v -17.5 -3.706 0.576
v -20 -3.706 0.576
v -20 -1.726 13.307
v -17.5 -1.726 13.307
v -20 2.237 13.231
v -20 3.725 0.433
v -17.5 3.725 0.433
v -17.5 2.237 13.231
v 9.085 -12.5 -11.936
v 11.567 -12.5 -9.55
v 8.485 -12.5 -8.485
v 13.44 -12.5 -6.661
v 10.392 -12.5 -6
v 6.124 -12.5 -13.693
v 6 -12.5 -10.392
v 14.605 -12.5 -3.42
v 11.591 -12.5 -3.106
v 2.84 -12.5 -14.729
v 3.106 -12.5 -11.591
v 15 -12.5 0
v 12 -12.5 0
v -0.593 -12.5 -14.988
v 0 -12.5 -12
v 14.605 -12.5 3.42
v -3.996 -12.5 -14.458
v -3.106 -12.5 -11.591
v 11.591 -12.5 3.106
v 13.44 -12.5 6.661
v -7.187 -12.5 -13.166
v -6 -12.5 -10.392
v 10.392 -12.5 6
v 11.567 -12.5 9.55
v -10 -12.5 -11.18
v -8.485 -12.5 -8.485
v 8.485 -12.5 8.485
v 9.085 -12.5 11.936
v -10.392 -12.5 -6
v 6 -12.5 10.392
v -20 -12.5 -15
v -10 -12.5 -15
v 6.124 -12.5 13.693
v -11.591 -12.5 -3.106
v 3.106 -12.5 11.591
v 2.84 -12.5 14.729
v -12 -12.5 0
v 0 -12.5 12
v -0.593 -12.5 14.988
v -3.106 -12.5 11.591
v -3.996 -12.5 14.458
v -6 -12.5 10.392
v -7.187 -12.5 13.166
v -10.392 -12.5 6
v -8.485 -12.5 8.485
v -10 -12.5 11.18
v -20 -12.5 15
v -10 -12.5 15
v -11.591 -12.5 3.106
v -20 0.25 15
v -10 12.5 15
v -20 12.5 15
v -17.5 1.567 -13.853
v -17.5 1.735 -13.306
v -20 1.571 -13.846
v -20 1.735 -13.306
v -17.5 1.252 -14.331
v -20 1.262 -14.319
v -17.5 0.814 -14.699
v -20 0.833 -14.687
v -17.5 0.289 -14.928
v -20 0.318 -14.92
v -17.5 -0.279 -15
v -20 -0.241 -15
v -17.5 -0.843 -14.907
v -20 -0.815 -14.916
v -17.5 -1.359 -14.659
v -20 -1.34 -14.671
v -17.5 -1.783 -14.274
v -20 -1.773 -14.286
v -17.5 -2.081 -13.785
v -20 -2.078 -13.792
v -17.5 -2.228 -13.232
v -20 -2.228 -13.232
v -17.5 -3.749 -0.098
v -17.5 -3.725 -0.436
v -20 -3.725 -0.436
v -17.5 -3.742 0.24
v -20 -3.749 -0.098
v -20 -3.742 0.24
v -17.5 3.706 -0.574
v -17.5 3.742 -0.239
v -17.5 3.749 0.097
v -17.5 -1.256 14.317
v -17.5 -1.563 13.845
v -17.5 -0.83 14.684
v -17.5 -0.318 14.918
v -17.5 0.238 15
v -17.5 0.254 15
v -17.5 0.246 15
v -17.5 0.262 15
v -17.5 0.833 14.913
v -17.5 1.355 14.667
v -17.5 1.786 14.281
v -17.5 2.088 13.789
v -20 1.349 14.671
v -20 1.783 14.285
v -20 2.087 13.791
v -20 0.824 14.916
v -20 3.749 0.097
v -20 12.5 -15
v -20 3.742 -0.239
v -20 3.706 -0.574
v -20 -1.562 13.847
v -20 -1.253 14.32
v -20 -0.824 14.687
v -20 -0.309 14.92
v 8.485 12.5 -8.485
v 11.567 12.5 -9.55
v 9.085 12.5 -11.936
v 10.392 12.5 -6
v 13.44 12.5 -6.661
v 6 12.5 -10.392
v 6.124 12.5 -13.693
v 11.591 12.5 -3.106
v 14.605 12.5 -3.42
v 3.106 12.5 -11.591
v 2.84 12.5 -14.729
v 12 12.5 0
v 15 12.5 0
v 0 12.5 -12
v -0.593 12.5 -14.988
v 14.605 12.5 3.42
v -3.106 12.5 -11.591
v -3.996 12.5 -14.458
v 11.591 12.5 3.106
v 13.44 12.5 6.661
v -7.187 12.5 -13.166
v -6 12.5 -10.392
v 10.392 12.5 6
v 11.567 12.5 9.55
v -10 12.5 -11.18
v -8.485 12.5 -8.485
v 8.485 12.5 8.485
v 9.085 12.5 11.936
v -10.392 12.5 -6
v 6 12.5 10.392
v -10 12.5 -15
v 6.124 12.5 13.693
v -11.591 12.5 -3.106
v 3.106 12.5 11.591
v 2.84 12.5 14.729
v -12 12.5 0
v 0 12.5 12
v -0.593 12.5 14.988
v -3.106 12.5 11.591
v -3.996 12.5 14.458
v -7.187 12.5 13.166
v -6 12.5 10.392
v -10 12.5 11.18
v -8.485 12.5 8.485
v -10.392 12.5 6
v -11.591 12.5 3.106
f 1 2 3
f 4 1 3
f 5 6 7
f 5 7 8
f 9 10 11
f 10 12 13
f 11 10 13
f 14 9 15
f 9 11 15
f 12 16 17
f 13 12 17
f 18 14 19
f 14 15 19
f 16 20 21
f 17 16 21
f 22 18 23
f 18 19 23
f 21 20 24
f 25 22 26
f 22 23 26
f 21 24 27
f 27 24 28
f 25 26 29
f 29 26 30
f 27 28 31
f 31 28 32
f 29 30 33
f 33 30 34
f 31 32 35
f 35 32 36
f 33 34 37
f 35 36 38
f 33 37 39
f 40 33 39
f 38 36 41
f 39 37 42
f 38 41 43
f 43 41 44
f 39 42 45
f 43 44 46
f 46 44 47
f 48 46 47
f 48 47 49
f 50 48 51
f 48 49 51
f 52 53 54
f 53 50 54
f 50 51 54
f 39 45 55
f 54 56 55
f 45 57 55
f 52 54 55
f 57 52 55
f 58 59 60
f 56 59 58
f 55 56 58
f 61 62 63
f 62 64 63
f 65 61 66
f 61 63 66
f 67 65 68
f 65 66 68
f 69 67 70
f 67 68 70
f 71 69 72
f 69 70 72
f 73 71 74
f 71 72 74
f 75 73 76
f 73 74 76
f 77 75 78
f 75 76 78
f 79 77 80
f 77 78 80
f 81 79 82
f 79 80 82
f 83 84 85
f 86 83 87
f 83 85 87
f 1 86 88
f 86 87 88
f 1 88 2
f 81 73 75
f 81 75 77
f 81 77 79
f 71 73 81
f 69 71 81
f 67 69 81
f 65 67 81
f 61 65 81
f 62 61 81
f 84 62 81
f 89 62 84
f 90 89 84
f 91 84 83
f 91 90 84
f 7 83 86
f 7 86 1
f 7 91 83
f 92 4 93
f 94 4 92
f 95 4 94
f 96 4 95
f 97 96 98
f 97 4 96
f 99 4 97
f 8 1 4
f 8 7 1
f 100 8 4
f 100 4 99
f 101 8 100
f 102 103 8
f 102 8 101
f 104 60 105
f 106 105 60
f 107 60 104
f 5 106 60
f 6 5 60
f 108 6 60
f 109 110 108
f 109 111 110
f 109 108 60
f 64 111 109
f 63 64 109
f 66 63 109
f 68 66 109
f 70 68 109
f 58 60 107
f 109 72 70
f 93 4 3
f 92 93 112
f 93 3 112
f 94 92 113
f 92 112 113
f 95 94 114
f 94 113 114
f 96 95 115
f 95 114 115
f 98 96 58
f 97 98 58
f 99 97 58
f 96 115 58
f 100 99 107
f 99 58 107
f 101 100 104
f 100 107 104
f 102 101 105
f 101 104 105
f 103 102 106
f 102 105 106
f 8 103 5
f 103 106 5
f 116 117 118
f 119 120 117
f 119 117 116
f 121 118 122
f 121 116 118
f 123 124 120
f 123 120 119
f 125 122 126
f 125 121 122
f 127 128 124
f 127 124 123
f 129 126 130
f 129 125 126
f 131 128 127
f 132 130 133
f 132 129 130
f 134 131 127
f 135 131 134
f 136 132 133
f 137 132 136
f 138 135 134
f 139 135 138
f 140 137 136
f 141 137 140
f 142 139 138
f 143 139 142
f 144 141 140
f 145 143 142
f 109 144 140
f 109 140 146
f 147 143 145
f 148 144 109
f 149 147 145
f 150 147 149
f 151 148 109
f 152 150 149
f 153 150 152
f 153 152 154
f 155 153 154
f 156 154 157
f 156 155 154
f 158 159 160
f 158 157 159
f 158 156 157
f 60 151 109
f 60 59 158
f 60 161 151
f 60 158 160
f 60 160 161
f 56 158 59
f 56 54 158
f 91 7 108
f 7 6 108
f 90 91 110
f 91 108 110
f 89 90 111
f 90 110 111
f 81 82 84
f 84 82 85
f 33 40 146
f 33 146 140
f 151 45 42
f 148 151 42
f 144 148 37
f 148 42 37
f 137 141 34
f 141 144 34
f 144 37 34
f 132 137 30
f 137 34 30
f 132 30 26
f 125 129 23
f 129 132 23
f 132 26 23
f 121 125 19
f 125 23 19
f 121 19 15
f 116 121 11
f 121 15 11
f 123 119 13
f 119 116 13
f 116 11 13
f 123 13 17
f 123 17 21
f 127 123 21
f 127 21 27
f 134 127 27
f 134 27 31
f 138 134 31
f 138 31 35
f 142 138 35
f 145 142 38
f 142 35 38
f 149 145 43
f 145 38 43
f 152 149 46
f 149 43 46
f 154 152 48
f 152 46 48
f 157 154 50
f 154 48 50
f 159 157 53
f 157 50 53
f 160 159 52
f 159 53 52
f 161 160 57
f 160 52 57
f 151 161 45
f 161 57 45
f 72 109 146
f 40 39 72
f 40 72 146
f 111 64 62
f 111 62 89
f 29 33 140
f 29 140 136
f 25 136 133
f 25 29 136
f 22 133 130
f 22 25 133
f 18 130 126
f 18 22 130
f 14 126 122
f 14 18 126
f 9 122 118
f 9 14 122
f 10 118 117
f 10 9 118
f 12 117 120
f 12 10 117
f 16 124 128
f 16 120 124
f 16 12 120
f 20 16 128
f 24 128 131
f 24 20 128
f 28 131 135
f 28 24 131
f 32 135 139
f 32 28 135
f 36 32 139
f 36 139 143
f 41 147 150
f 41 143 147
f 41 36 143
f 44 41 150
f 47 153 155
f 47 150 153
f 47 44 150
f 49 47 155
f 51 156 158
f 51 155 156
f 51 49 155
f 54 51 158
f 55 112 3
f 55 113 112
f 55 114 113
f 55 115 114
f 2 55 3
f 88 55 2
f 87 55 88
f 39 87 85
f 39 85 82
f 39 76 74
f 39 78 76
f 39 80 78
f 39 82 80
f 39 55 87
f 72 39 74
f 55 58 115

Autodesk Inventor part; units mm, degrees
ref_plane "YZ Plane" through (0, 0, 0) normal (1, 0, 0) x (0, 1, 0)
ref_plane "XZ Plane" through (0, 0, 0) normal (0, 1, 0) x (-1, 0, 0)
ref_plane "XY Plane" through (0, 0, 0) normal (0, 0, 1) x (1, 0, 0)
sketch "Sketch1" plane through (0, 0, 0) normal (0, 1, 0) x (-1, 0, 0)
  arc A0 (12, 9) -> (10, -11.1803) centre (0, 0) ccw
  line L0 (10, 15) -> (20, 15)
  line L1 (20, 15) -> (20, -15)
  line L2 (20, -15) -> (10, -15)
  line L3 (10, 15) -> (20, -15) construction
  line L4 (20, 15) -> (10, -15) construction
  line L5 (10, -15) -> (10, -11.1803)
  line L6 (10, 11.1803) -> (10, 15)
  circle A1 centre (0, 0) radius 12
  dimension "d0" = 30
  dimension "d1" = 10
  dimension "d2" = 30
  dimension "d3" = 18.435
  dimension "d4" = 20
  dimension "d5" = 24
extrude "Extrusion1" add sketch "Sketch1" along normal mid plane 25
sketch "Sketch2" plane through (-20, -12.5, 15) normal (-1, 0, 0) x (0, 0, 1)
  arc A0 (-1.6928, 10.7737) -> (-1.769, 14.7366) centre (-2, 12.75) ccw
  arc A1 (-28.3059, 14.235) -> (-28.2323, 10.2721) centre (-28, 12.2586) ccw
  line L0 (-28.3059, 14.235) -> (-15.5736, 16.2059)
  line L1 (-28.2323, 10.2721) -> (-15.4356, 8.7754)
  line L2 (-14.5668, 16.2249) -> (-1.769, 14.7366)
  line L3 (-14.4239, 8.7945) -> (-1.6928, 10.7737)
  arc A2 (-15.4356, 8.7754) -> (-14.4239, 8.7945) centre (-15, 12.5) ccw
  arc A3 (-14.5668, 16.2249) -> (-15.5736, 16.2059) centre (-15, 12.5) ccw
  dimension "d8" = 4
  dimension "d9" = 4
  dimension "d11" = 26
  dimension "d12" = 13
extrude "Extrusion2" cut sketch "Sketch2" against normal blind 2.5
properties part number "motor mount"
